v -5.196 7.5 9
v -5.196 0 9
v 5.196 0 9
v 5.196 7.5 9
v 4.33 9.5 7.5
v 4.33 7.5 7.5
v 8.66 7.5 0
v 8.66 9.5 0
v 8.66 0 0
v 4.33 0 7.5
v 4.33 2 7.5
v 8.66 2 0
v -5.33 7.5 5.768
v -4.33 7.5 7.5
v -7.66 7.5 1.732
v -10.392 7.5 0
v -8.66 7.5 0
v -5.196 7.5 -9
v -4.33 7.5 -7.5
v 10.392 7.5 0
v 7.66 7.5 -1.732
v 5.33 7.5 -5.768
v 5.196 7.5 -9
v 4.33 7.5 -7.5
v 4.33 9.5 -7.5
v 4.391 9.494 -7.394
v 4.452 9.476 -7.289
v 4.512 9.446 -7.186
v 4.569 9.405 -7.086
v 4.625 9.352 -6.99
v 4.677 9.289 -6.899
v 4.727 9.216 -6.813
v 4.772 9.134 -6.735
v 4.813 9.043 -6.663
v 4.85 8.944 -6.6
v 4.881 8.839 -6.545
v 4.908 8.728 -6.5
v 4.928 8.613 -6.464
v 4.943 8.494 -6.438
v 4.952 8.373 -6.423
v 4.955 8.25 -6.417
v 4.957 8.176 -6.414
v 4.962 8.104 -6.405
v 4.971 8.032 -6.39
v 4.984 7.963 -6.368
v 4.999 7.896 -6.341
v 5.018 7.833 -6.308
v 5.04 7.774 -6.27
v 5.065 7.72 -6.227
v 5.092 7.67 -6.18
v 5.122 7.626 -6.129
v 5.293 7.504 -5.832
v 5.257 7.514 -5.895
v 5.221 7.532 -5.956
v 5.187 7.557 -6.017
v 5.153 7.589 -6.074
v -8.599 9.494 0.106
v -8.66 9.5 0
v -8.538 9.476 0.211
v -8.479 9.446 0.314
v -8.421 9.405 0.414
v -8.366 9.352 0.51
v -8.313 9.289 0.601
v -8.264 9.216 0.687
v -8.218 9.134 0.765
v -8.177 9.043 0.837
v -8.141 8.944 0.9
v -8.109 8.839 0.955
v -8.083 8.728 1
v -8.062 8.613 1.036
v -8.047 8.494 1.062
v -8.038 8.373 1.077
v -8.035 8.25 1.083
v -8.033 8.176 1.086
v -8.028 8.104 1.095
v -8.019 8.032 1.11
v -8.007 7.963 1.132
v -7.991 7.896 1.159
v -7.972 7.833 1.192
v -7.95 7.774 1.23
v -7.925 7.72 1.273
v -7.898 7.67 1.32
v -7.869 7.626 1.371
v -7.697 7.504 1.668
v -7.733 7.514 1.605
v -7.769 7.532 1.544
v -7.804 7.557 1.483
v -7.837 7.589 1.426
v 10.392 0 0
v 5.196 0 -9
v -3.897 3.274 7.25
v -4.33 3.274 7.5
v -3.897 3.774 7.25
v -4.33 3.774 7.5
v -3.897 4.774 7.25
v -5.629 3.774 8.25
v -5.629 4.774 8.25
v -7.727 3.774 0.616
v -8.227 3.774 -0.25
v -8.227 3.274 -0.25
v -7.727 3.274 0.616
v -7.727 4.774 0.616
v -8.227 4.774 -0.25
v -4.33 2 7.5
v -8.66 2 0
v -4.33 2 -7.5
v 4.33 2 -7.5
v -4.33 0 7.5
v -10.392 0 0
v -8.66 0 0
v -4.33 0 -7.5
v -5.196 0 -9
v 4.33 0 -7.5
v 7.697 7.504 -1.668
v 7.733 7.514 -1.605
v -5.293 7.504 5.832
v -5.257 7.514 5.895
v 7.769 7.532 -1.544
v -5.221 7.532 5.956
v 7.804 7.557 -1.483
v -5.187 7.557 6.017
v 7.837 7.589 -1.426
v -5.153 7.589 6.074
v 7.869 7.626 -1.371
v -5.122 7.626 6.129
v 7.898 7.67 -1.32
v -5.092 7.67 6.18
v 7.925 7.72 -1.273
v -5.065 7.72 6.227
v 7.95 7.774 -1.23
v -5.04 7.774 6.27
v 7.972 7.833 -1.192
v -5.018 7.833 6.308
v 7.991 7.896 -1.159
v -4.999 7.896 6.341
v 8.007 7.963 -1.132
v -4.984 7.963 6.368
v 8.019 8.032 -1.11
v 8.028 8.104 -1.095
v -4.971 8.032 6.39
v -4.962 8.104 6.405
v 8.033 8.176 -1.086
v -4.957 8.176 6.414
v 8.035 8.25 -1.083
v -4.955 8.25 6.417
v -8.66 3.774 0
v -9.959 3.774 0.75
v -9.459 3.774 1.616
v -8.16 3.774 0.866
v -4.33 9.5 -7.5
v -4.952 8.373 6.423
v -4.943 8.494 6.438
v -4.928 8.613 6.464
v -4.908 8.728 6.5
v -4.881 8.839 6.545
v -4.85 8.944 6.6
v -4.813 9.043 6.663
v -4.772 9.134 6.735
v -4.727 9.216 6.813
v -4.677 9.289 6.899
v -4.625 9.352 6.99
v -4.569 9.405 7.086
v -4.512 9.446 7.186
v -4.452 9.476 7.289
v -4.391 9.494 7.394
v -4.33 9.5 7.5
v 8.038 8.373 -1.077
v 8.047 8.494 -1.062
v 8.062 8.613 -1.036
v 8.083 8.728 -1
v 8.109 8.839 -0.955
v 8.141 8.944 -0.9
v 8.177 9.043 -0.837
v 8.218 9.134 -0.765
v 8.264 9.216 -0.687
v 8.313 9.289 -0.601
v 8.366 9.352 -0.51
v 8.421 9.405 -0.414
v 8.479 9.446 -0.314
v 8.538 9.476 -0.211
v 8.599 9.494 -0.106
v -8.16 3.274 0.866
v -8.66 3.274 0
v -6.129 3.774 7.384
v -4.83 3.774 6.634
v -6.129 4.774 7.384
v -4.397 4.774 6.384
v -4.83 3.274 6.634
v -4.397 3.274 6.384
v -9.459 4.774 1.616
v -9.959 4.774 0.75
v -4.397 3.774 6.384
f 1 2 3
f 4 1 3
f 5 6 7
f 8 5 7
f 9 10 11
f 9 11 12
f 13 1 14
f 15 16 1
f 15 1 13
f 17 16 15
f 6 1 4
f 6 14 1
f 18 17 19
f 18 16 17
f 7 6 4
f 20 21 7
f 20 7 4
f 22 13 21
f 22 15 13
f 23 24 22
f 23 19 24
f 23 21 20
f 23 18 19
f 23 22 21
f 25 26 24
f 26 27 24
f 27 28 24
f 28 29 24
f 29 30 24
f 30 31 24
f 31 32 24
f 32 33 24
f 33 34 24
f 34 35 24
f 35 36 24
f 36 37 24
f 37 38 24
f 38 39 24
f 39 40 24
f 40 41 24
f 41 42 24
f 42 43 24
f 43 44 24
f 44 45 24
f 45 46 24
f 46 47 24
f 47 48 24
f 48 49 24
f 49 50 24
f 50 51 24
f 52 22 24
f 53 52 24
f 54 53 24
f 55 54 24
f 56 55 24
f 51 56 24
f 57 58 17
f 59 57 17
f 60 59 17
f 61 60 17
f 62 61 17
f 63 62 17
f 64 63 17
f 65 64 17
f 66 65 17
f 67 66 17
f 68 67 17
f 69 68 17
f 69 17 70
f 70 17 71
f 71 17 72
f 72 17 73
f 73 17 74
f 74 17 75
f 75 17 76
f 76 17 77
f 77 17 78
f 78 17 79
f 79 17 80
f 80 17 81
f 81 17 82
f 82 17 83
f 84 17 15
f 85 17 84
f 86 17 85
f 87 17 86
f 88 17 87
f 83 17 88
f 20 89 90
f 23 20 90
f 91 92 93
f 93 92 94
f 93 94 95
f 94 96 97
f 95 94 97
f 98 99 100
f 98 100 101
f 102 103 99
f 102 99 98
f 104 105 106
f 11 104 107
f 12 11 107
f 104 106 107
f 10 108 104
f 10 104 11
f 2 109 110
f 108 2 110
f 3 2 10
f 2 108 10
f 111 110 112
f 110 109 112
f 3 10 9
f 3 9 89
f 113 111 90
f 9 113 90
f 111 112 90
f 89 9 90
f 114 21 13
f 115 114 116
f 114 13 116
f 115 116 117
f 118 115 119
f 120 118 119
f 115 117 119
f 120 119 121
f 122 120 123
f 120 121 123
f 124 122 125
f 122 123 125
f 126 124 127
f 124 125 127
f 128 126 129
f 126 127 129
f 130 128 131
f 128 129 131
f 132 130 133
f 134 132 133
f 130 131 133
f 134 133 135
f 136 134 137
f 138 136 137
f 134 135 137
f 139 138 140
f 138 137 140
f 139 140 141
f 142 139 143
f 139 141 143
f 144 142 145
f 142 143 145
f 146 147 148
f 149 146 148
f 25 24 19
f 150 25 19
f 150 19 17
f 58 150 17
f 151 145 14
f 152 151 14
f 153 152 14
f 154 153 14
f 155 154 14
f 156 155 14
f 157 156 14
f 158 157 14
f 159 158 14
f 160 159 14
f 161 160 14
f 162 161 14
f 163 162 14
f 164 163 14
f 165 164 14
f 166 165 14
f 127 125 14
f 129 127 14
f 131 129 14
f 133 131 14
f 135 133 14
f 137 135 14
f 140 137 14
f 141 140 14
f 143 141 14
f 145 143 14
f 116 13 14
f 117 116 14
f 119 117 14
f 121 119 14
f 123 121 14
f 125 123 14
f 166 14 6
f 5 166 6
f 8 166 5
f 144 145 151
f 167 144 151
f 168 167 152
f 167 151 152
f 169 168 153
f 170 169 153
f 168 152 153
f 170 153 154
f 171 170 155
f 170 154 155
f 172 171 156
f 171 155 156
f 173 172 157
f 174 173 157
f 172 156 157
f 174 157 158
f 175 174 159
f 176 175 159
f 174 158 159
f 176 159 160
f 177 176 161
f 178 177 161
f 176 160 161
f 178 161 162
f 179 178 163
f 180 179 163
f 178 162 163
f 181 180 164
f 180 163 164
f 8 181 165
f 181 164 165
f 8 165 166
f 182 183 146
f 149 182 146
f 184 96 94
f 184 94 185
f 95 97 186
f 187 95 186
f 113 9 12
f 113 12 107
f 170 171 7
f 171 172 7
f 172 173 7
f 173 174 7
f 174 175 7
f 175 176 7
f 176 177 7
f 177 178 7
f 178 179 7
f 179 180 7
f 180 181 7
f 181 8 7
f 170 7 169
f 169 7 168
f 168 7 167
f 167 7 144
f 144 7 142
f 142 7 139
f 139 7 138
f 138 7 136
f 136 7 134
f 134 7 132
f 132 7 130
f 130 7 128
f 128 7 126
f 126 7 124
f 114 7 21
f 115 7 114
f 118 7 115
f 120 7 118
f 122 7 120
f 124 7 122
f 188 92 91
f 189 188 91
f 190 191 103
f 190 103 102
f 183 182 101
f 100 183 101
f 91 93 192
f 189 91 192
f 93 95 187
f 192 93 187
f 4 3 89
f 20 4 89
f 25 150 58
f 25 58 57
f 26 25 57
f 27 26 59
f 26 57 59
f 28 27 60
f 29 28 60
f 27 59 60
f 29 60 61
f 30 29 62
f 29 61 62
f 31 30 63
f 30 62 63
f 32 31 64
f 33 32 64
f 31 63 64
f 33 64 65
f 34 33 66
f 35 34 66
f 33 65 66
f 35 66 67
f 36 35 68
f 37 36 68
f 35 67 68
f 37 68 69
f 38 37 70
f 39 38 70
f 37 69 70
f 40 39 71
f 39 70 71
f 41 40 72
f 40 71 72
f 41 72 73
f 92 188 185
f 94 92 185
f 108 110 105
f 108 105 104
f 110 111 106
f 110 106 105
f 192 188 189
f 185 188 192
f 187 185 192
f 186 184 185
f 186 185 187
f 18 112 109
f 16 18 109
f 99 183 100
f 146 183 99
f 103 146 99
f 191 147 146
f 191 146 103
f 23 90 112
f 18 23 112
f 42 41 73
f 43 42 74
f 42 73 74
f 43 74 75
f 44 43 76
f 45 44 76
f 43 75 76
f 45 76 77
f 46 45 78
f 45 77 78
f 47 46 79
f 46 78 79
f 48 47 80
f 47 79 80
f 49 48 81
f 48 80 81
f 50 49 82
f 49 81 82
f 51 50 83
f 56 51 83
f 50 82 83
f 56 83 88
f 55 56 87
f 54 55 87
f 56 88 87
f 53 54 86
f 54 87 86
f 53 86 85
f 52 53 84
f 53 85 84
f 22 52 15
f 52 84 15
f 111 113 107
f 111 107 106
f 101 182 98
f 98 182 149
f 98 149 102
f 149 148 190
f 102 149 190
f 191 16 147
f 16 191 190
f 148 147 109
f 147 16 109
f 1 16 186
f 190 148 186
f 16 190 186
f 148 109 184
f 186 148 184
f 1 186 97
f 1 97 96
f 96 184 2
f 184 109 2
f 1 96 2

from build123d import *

# Parameters (mm, degrees)
BOSS_EXTRUDE1_DEPTH = 7.5
CUT_EXTRUDE1_DEPTH  = 2
BOSS_EXTRUDE2_DEPTH = 2
CUT_EXTRUDE2_DEPTH  = 15
SKETCH6_W           = 1
SKETCH6_H           = 1
CUT_EXTRUDE3_DEPTH  = 2
SKETCH7_W           = 0.5
SKETCH7_H           = 0.5
CUT_EXTRUDE4_DEPTH  = 1


with BuildPart() as part:
    # Sketch1 → Boss-Extrude1 (new body)
    # profile 1 of 2: a face of its own
    with BuildSketch(Plane(origin=(0, 0, 0), x_dir=(1, 0, 0), z_dir=(0, 1, 0))):
        Polygon((-5.196152423, -9), (5.196152423, -9), (10.392304845, 0), (5.196152423, 9), (-5.196152423, 9), (-10.392304845, 0), align=None)
        Polygon((4.330127019, -7.5), (8.660254038, 0), (4.330127019, 7.5), (-4.330127019, 7.5), (-8.660254038, 0), (-4.330127019, -7.5), align=None, mode=Mode.SUBTRACT)
    # profile 2 of 2: a face of its own
    with BuildSketch(Plane(origin=(0, 0, 0), x_dir=(1, 0, 0), z_dir=(0, 1, 0))):
        Polygon((-4.330127019, -7.5), (4.330127019, -7.5), (8.660254038, 0), (4.330127019, 7.5), (-4.330127019, 7.5), (-8.660254038, 0), align=None)
    extrude(amount=BOSS_EXTRUDE1_DEPTH)

    # Sketch1<3> → Cut-Extrude1 (cut)
    with BuildSketch(Plane(origin=(0, 0, 0), x_dir=(1, 0, 0), z_dir=(0, 1, 0))):
        Polygon((-4.330127019, -7.5), (4.330127019, -7.5), (8.660254038, 0), (4.330127019, 7.5), (-4.330127019, 7.5), (-8.660254038, 0), align=None)
    extrude(amount=CUT_EXTRUDE1_DEPTH, mode=Mode.SUBTRACT)

    # Sketch4 → Boss-Extrude2 (add)
    with BuildSketch(Plane(origin=(0, 7.5, 0), x_dir=(1, 0, 0), z_dir=(0, 1, 0))):
        Polygon((8.660254038, 0), (4.330127019, 7.5), (-4.330127019, 7.5), (-8.660254038, 0), (-4.330127019, -7.5), (4.330127019, -7.5), align=None)
    extrude(amount=BOSS_EXTRUDE2_DEPTH)

    # Sketch5 → Cut-Extrude2 (cut)
    with BuildSketch(Plane(origin=(-6.495190528, 0, 3.75), x_dir=(0.5000000000000006, 0, 0.8660254037844384), z_dir=(-0.8660254037844384, 0, 0.5000000000000006))):
        with BuildLine():
            ThreePointArc((-3.080127019, 8.25), (-2.860457105, 7.719669914), (-2.330127019, 7.5))
            Line((-2.330127019, 7.5), (2.330127019, 7.5))
            ThreePointArc((2.330127019, 7.5), (2.860457105, 7.719669914), (3.080127019, 8.25))
            ThreePointArc((3.080127019, 8.25), (3.446243542, 9.133883476), (4.330127019, 9.5))
            Line((4.330127019, 9.5), (-4.330127019, 9.5))
            ThreePointArc((-4.330127019, 9.5), (-3.446243542, 9.133883476), (-3.080127019, 8.25))
        make_face()
    extrude(amount=-CUT_EXTRUDE2_DEPTH, mode=Mode.SUBTRACT)

    # Sketch6 → Cut-Extrude3 (cut)
    with BuildSketch(Plane(origin=(-7.794228634, 0, 4.5), x_dir=(0.5000000000000071, 0, 0.8660254037844346), z_dir=(-0.8660254037844345, 0, 0.500000000000007))):
        with Locations((-3.830127019, 4.273741672)):
            Rectangle(SKETCH6_W, SKETCH6_H)
    cut_extrude3 = extrude(amount=-CUT_EXTRUDE3_DEPTH, mode=Mode.SUBTRACT)

    # Sketch7 → Cut-Extrude4 (cut)
    with BuildSketch(Plane(origin=(-2.165063509, 0, -3.75), x_dir=(0.8660254037844346, 0, -0.5000000000000071), z_dir=(0.5000000000000071, 0, 0.8660254037844346))):
        with Locations((-7.25, 3.523741672)):
            Rectangle(SKETCH7_W, SKETCH7_H)
    cut_extrude4 = extrude(amount=CUT_EXTRUDE4_DEPTH, mode=Mode.SUBTRACT)

    # Mirror1: Cut-Extrude3, Cut-Extrude4 across plane
    add(cut_extrude3.mirror(Plane(origin=(0, 0, 0), x_dir=(-0.8660254037844349, 0, 0.5000000000000067), z_dir=(-0.500000000000007, 0, -0.8660254037844347))), mode=Mode.SUBTRACT)
    add(cut_extrude4.mirror(Plane(origin=(0, 0, 0), x_dir=(-0.8660254037844349, 0, 0.5000000000000067), z_dir=(-0.500000000000007, 0, -0.8660254037844347))), mode=Mode.SUBTRACT)


solid = part.part
